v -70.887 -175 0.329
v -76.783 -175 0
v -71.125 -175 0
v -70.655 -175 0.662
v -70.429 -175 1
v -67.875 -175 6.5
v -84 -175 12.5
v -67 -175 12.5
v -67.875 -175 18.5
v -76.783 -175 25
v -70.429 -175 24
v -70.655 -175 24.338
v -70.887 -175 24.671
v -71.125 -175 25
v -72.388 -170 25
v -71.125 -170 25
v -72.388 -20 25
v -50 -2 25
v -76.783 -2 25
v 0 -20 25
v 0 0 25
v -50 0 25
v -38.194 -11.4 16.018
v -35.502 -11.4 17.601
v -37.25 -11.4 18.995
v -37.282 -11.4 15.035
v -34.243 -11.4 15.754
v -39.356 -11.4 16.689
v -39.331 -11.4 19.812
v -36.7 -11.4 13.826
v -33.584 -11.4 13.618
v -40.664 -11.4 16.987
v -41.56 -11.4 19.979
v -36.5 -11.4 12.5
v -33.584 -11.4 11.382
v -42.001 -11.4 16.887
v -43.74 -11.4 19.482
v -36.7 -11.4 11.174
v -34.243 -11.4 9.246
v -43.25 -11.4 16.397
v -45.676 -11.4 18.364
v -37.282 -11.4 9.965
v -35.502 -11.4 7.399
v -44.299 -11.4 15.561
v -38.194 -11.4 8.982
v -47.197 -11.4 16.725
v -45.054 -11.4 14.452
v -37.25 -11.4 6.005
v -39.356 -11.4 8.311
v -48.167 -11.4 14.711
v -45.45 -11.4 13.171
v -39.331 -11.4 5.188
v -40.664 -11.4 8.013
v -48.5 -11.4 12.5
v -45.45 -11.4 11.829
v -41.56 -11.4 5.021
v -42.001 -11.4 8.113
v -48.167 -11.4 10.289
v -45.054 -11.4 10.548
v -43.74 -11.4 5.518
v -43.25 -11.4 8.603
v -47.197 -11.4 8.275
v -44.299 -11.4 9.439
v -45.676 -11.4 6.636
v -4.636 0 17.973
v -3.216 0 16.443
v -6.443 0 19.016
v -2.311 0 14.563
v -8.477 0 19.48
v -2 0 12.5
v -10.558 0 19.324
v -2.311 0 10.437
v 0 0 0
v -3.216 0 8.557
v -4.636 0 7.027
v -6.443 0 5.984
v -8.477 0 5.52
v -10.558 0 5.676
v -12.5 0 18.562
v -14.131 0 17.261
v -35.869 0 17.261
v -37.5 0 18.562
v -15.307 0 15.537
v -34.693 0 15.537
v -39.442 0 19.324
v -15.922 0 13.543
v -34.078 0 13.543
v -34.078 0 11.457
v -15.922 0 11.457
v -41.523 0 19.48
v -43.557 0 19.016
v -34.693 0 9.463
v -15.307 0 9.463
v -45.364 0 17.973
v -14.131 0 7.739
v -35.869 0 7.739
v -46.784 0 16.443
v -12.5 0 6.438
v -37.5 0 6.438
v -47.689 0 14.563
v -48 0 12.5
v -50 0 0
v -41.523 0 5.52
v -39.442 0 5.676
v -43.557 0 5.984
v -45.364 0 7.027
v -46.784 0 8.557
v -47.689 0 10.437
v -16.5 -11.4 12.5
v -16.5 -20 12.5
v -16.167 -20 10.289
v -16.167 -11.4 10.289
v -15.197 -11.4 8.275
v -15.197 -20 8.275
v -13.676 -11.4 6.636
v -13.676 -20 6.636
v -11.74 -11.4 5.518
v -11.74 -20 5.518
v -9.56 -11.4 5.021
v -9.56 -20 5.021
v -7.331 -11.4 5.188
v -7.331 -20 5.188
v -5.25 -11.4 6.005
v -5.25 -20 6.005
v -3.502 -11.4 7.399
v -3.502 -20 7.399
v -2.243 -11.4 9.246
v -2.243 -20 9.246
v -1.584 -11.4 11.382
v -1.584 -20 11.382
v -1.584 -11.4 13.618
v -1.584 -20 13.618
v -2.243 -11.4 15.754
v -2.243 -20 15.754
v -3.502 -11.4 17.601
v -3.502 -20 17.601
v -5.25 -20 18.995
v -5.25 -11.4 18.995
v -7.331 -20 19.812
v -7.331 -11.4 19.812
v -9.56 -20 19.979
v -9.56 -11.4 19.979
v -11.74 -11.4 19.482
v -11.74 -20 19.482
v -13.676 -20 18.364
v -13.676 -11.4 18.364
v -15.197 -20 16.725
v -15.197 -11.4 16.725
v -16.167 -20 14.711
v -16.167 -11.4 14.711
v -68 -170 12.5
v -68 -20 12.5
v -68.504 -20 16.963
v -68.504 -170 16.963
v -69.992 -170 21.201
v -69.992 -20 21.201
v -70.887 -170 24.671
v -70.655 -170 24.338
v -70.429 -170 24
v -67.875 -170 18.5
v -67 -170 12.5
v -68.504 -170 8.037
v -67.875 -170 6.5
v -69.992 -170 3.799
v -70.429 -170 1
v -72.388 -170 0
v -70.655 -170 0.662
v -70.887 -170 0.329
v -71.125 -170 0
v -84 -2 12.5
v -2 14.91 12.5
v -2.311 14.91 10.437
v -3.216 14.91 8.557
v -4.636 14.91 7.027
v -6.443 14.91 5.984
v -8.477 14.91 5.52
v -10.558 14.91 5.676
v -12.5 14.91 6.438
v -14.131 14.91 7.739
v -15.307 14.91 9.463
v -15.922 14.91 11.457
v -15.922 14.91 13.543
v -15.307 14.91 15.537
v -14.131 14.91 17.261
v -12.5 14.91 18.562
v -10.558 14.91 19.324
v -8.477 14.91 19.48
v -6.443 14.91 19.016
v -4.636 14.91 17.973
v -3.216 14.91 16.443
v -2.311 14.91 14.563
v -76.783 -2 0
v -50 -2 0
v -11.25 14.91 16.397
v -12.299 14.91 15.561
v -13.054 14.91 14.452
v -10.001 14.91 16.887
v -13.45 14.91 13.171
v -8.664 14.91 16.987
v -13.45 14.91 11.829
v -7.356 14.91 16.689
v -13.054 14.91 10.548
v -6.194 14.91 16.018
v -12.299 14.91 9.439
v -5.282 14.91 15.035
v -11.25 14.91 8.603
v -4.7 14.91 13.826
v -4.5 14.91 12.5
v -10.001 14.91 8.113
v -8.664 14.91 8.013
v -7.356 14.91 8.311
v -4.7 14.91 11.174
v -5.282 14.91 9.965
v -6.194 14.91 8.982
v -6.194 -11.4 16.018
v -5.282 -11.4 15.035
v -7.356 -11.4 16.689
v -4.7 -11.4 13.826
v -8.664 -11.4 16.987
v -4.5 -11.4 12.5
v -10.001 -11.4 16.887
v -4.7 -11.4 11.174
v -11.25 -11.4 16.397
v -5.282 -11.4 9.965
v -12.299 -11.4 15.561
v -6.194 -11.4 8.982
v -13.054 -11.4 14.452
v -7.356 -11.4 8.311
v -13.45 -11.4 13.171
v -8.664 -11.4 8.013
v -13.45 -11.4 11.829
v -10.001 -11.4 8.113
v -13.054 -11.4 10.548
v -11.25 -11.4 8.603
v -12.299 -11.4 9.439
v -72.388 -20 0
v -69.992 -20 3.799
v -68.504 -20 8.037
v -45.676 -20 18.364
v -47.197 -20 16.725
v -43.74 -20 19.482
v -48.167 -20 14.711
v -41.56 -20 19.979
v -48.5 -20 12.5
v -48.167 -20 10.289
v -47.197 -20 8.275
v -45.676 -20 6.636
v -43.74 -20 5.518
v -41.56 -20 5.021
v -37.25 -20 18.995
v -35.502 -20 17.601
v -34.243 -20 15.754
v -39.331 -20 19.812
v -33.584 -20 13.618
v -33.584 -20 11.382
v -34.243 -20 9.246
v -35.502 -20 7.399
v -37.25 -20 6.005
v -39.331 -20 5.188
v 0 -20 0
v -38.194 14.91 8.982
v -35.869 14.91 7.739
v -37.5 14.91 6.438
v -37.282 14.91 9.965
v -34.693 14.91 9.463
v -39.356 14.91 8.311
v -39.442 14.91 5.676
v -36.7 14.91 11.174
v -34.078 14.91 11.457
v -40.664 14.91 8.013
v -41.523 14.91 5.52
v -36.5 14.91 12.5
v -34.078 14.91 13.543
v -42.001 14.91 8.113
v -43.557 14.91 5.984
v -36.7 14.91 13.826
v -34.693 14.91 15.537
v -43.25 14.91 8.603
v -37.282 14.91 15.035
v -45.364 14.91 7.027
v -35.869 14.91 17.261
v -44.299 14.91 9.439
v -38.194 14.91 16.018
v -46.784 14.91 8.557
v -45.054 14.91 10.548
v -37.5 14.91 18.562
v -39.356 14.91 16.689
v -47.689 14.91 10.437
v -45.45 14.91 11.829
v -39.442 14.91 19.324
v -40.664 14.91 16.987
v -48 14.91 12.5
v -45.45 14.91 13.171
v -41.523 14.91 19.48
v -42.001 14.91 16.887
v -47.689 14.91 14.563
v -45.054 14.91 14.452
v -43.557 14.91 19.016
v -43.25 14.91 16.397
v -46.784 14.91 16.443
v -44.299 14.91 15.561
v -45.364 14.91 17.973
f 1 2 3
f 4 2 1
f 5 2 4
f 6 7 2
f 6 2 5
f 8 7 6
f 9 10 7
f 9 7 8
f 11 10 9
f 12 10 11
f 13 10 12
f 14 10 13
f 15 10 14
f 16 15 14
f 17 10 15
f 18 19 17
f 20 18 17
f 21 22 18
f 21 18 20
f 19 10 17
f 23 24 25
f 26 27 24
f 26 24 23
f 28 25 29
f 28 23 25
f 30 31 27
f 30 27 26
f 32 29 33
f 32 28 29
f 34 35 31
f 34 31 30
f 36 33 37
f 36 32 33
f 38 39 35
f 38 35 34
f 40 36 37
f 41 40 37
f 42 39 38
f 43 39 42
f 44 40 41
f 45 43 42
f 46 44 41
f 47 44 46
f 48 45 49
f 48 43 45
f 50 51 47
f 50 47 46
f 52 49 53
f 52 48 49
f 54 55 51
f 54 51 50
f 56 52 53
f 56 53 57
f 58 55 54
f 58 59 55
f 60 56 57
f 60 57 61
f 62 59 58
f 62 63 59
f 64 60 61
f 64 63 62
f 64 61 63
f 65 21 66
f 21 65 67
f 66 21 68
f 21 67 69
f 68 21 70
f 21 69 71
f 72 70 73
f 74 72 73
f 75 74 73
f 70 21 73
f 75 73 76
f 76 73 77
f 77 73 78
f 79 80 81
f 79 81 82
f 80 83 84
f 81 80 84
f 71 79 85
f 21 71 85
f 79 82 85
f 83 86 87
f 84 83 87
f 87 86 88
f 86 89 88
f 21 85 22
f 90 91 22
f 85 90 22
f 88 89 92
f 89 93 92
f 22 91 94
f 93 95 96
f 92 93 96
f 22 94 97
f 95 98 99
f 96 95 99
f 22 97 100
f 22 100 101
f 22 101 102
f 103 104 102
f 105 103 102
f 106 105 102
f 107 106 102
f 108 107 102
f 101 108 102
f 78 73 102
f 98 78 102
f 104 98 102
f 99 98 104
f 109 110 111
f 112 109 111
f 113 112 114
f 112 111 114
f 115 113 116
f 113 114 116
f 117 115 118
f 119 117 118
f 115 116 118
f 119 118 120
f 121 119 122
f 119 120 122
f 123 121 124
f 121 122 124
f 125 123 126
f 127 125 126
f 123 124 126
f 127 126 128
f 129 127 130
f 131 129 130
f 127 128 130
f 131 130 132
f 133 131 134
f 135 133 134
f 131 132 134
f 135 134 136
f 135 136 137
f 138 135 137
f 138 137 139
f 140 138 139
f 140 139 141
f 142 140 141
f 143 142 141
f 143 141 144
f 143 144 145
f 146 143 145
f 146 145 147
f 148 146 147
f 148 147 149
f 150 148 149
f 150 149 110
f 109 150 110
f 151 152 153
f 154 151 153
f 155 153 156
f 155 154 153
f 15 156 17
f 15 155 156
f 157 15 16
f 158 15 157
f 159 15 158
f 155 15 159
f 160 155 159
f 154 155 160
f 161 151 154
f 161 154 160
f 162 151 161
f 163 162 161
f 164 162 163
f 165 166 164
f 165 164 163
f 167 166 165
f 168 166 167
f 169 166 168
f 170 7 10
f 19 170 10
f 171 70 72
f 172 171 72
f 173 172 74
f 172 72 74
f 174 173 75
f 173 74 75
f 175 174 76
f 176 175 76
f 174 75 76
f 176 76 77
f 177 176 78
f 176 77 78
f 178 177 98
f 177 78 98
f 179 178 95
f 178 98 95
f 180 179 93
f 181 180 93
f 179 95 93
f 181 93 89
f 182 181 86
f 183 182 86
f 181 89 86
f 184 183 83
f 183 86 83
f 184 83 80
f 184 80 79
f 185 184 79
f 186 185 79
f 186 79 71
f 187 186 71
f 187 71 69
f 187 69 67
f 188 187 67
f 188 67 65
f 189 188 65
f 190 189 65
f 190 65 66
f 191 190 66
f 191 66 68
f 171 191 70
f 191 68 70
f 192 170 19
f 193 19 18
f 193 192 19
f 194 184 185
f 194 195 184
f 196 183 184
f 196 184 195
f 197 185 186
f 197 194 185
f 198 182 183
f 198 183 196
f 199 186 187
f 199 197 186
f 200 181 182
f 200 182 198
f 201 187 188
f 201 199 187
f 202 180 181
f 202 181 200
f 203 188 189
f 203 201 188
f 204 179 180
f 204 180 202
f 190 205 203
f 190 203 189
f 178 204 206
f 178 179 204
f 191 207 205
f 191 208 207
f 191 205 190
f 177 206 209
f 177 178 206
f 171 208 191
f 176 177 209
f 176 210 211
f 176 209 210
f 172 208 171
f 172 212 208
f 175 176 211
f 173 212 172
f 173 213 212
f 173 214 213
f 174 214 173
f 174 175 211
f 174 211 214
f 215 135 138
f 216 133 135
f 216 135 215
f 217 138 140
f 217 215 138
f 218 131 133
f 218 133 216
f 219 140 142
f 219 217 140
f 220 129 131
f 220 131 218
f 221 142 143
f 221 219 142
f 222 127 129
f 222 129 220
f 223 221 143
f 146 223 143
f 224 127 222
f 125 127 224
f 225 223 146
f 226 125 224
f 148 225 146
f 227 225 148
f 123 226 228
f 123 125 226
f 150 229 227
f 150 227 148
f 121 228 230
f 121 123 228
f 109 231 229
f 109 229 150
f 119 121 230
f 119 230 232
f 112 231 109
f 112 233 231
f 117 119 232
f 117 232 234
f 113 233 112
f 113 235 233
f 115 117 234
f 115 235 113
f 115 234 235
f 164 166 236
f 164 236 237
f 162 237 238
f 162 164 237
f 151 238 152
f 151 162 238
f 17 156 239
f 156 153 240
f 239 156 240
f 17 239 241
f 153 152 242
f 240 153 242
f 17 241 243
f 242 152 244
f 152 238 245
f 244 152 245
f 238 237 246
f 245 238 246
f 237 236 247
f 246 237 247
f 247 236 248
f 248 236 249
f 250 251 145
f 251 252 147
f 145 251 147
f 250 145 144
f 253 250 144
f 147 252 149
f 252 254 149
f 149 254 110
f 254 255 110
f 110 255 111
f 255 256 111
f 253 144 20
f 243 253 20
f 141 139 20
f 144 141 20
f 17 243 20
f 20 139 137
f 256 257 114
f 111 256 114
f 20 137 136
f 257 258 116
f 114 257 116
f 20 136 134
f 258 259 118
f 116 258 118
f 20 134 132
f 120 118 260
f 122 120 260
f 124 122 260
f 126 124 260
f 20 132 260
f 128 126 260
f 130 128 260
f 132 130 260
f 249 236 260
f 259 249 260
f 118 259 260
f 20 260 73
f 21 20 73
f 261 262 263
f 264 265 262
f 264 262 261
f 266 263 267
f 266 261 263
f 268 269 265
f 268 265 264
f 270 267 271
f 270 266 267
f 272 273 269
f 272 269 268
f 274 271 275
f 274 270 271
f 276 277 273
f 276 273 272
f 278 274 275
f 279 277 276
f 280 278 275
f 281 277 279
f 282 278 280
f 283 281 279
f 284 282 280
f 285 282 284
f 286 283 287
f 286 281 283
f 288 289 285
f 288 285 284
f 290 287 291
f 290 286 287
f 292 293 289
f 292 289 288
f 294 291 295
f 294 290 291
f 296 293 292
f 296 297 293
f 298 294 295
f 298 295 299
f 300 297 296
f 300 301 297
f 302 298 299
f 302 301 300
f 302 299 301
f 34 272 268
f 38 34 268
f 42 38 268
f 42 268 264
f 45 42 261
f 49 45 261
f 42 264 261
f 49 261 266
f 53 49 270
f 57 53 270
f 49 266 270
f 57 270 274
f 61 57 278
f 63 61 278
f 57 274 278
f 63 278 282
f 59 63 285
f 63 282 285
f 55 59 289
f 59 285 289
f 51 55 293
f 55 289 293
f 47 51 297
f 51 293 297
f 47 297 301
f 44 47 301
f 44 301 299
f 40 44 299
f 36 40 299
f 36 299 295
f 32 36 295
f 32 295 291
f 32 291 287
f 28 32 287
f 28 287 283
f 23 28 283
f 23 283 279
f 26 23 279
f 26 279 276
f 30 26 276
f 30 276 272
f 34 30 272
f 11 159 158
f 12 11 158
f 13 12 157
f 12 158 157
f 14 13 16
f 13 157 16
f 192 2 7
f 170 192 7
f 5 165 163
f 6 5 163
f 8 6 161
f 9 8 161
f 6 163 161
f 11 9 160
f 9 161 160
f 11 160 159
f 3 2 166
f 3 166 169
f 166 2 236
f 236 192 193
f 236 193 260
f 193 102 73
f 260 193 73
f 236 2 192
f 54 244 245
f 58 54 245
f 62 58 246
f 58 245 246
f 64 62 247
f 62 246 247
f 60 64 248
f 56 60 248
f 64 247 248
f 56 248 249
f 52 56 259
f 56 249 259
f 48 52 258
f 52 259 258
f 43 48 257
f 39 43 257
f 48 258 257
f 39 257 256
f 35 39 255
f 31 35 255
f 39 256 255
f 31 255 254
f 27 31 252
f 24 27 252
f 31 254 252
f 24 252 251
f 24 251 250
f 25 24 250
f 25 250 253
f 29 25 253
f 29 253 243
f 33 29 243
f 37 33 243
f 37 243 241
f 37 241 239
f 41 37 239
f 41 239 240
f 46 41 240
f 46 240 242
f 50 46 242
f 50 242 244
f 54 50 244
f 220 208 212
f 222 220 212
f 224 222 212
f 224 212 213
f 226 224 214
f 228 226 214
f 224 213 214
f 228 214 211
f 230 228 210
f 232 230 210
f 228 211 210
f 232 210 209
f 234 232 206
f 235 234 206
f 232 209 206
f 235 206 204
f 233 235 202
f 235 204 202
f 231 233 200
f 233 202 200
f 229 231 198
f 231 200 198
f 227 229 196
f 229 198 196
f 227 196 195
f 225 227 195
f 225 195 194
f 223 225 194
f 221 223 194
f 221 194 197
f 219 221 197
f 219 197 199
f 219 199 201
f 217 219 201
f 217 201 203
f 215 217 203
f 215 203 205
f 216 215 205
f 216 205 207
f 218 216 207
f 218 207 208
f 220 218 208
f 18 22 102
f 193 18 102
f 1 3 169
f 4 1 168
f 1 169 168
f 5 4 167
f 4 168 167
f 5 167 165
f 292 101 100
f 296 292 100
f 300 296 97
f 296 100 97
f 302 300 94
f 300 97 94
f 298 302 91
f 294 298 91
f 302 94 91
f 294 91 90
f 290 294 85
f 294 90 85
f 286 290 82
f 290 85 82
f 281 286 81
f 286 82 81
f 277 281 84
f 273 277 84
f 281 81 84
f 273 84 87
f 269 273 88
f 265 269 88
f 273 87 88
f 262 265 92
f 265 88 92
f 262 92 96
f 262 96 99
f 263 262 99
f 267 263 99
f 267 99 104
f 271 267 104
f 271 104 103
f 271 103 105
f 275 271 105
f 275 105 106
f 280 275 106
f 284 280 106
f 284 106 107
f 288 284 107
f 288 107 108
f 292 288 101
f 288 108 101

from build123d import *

# Parameters (mm, degrees)
ESTRUSIONE_ESTRUSIONE1_DEPTH                         = 25
SCHIZZO3_R                                           = 7
ESTRUSIONE_ESTRUSIONE2_DEPTH                         = 14.91
FORO_LAMATO_PER_VITE_M8_A_TESTA_CILINDRI_D           = 9
FORO_LAMATO_PER_VITE_M8_A_TESTA_CILINDRI_DEPTH       = 34.91
FORO_LAMATO_PER_VITE_M8_A_TESTA_CILINDRI_CBORE_D     = 15
FORO_LAMATO_PER_VITE_M8_A_TESTA_CILINDRI_CBORE_DEPTH = 8.6
TAGLIO_ESTRUSIONE3_DEPTH                             = 150
TAGLIO_ESTRUSIONE4_DEPTH                             = 30
TAGLIO_ESTRUSIONE5_START                             = -20
TAGLIO_ESTRUSIONE5_DEPTH                             = 20
TAGLIO_ESTRUSIONE6_DEPTH                             = 180
TAGLIO_ESTRUSIONE7_START                             = -5
TAGLIO_ESTRUSIONE7_DEPTH                             = 5
TAGLIO_ESTRUSIONE8_DEPTH                             = 2


with BuildPart() as part:
    # Schizzo2 → Estrusione-Estrusione1 (new body)
    with BuildSketch(Plane.XY):
        Polygon((0, 0), (-88, 0), (-88, -200), (-48, -200), (-48, -170), (-68, -170), (-68, -20), (0, -20), align=None)
    extrude(amount=ESTRUSIONE_ESTRUSIONE1_DEPTH)

    # Schizzo3 → Estrusione-Estrusione2 (add)
    with BuildSketch(Plane(origin=(0, 0, 0), x_dir=(1, 0, 0), z_dir=(0, 1, 0))):
        with Locations(Location((-41, -12.5, 0), (0, 0, 180))):
            Circle(SCHIZZO3_R)
        with Locations((-9, -12.5)):
            Circle(SCHIZZO3_R)
    extrude(amount=ESTRUSIONE_ESTRUSIONE2_DEPTH)

    # Foro lamato per Vite M8 a testa cilindrica-1
    with Locations(Plane(origin=(0, -20, 0), x_dir=(-1, 0, 0), z_dir=(0, -1, 0))):
        with Locations((9, -12.5), (41, -12.5)):
            CounterBoreHole(FORO_LAMATO_PER_VITE_M8_A_TESTA_CILINDRI_D / 2, FORO_LAMATO_PER_VITE_M8_A_TESTA_CILINDRI_CBORE_D / 2, FORO_LAMATO_PER_VITE_M8_A_TESTA_CILINDRI_CBORE_DEPTH, depth=FORO_LAMATO_PER_VITE_M8_A_TESTA_CILINDRI_DEPTH)

    # Schizzo10 → Taglio-Estrusione3 (cut)
    with BuildSketch(Plane(origin=(0, -170, 0), x_dir=(1, 0, 0), z_dir=(0, 1, 0))):
        with BuildLine():
            Line((-68, 0), (-72.387505004, 0))
            ThreePointArc((-72.387505004, 0), (-69.128726859, -5.876175573), (-68, -12.5))
            Line((-68, -12.5), (-68, 0))
        make_face()
        with BuildLine():
            Line((-68, -25), (-68, -12.5))
            ThreePointArc((-68, -12.5), (-69.128726859, -19.123824427), (-72.387505004, -25))
            Line((-72.387505004, -25), (-68, -25))
        make_face()
    extrude(amount=TAGLIO_ESTRUSIONE3_DEPTH, mode=Mode.SUBTRACT)

    # Schizzo11 → Taglio-Estrusione4 (cut)
    with BuildSketch(Plane(origin=(0, -170, 0), x_dir=(1, 0, 0), z_dir=(0, 1, 0))):
        with BuildLine():
            Line((-48, -25), (-48, 0))
            Line((-48, 0), (-71.125462969, 0))
            ThreePointArc((-71.125462969, 0), (-70.769833543, -0.494944237), (-70.428716609, -1))
            ThreePointArc((-70.428716609, -1), (-67, -12.5), (-70.428716609, -24))
            ThreePointArc((-70.428716609, -24), (-70.769833543, -24.505055763), (-71.125462969, -25))
            Line((-71.125462969, -25), (-48, -25))
        make_face()
    extrude(amount=-TAGLIO_ESTRUSIONE4_DEPTH, mode=Mode.SUBTRACT)

    # Schizzo12 → Taglio-Estrusione5 (cut)
    with BuildSketch(Plane.XZ.offset(200).offset(TAGLIO_ESTRUSIONE5_START)):
        with BuildLine():
            Line((-71.125462969, 25), (-88, 25))
            Line((-88, 25), (-88, 0))
            Line((-88, 0), (-71.125462969, 0))
            ThreePointArc((-71.125462969, 0), (-67, 12.5), (-71.125462969, 25))
        make_face()
    extrude(amount=TAGLIO_ESTRUSIONE5_DEPTH, mode=Mode.SUBTRACT)

    # Schizzo13 → Taglio-Estrusione6 (cut)
    with BuildSketch(Plane.XZ.offset(180)):
        Polygon((-88, 25), (-88, 12.5), (-84, 12.5), (-76.783121635, 25), align=None)
        Polygon((-84, 12.5), (-88, 12.5), (-88, 0), (-76.783121635, 0), align=None)
    extrude(amount=-TAGLIO_ESTRUSIONE6_DEPTH, mode=Mode.SUBTRACT)

    # Schizzo14 → Taglio-Estrusione7 (cut)
    with BuildSketch(Plane.XZ.offset(180).offset(TAGLIO_ESTRUSIONE7_START)):
        with BuildLine():
            Line((-76.783121635, 25), (-84, 12.5))
            Line((-84, 12.5), (-76.783121635, 0))
            Line((-76.783121635, 0), (-71.125462969, 0))
            ThreePointArc((-71.125462969, 0), (-67, 12.5), (-71.125462969, 25))
            Line((-71.125462969, 25), (-76.783121635, 25))
        make_face()
    extrude(amount=TAGLIO_ESTRUSIONE7_DEPTH, mode=Mode.SUBTRACT)

    # Schizzo15 → Taglio-Estrusione8 (cut)
    with BuildSketch(Plane(origin=(0, 0, 0), x_dir=(1, 0, 0), z_dir=(0, 1, 0))):
        Polygon((-76.783121635, -25), (-50, -25), (-50, 0), (-76.783121635, 0), (-84, -12.5), align=None)
    extrude(amount=-TAGLIO_ESTRUSIONE8_DEPTH, mode=Mode.SUBTRACT)


solid = part.part
